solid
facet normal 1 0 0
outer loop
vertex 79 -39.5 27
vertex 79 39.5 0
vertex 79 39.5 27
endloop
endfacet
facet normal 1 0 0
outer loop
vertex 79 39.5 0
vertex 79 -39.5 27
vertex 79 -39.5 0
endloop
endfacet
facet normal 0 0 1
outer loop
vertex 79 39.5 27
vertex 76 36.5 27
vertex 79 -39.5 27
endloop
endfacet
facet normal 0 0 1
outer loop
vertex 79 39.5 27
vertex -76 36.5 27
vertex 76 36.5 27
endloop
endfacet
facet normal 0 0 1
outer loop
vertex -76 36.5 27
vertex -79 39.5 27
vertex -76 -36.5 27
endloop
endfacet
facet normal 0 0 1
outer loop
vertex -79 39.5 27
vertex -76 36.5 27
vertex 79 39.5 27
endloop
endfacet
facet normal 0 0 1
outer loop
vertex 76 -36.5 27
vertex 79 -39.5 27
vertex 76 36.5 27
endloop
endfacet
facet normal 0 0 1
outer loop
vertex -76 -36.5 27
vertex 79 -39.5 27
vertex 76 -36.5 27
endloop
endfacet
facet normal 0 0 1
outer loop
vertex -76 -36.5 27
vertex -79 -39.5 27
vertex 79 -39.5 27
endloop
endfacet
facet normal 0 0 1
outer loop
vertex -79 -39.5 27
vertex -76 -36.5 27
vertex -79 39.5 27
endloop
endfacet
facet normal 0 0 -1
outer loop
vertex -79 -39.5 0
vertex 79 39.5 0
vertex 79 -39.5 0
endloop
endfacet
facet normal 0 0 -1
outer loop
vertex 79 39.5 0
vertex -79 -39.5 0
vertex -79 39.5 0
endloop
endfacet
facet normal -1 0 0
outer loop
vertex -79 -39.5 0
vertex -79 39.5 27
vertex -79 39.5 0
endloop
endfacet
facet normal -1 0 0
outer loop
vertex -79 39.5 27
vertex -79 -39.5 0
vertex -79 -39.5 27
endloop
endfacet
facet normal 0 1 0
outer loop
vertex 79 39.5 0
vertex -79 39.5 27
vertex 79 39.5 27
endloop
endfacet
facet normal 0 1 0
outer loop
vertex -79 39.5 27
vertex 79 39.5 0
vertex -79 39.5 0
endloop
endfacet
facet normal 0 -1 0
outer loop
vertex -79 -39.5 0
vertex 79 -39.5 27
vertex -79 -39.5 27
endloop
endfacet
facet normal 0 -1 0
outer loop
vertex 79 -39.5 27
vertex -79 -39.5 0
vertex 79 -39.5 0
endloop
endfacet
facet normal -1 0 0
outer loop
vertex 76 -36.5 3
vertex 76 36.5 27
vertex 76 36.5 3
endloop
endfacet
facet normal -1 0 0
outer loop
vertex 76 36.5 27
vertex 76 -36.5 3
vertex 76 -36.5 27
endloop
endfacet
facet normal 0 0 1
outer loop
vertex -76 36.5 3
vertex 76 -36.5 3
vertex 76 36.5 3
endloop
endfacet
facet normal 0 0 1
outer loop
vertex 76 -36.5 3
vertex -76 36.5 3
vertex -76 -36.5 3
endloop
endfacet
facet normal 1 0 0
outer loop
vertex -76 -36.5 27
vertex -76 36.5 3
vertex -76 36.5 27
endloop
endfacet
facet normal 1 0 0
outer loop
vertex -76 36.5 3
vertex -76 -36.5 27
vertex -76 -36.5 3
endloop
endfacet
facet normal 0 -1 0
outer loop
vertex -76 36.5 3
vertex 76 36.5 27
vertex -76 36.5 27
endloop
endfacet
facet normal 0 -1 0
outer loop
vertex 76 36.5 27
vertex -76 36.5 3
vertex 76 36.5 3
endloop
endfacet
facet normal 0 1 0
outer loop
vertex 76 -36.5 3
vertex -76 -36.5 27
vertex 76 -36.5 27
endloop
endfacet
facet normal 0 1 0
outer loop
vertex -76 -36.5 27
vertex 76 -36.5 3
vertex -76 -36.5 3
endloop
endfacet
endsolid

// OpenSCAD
/*
 Creates a simple box that can be hung from a wire fence.  The
 default dimensions match a standard "chicken tractor" and can
 hold either food or water for about 4 chickens.

 If you want to hang on chicken wire, measure the distance between
 two horizontal twists and use that as the HangerPitch.
*/

BoxHeight = 27; // Height of box
BoxWidth = 158;  // Width
BoxDepth = 79;  // Depth
WallThickness = 3;  // Wall thickness
HangerWidth = 6; // Width of hanger
HangerHeight = 8; // Height of hanger
HangerPitch = 13; // Increments for hanger placement
HangerDepth = 3.2; // depth of hanger, also hanger offset

/*
  The rest of these are derived from
  the above.
*/
// Half values for translations
BoxHalfWidth = BoxWidth/2;
BoxHalfDepth = BoxDepth/2;
HangerHalfWidth = HangerWidth/2;
HangerInset = (HangerPitch-HangerWidth) / 2;

// Last possible offset for a hanger is based on the half width
HangerPitchCount = floor(BoxWidth/HangerPitch) -1;
HangerEdgeOffset = HangerPitch * HangerPitchCount / 2;

// Offsets for hanger.  Based on centering the hanger width within a hanger increment
LeftHangerPosition = -1 * (HangerEdgeOffset - HangerInset);
RightHangerPosition = HangerEdgeOffset - HangerWidth - HangerInset;
VerticalHangerOffset = BoxHeight - HangerHeight;
HangerOvershoot = HangerHeight - HangerDepth;
HangerOuterY = -1 * (BoxHalfDepth + (HangerDepth * 2));
HangerInnerY = -1 * (BoxHalfDepth + HangerDepth);

// spacer bar is based on the above
SpacerBarPosition = BoxHalfWidth / 5;
SpacerBarWidth = BoxWidth / 5;

// Create the main box, a simple cube with another smaller cube cut out
module MainBox() {
    translate([BoxHalfWidth*-1,BoxHalfDepth*-1,0]) {
        difference() {
            cube([BoxWidth,BoxDepth,BoxHeight]);
            translate([WallThickness,WallThickness,WallThickness]){
                cube([BoxWidth-(2*WallThickness),BoxDepth-(2*WallThickness),BoxHeight-WallThickness]);
            }
        }
    }
}

// Create a hanger, basically two overlapping cubes that will
// fit within the pitch supplied.
module Hanger(pos) {
    translate([pos,HangerOuterY,VerticalHangerOffset]) {
        cube([HangerWidth,HangerDepth,HangerHeight]);
        translate([0,HangerDepth,HangerOvershoot]) {
            cube([HangerWidth,HangerDepth,HangerDepth]);
        }
    }
}

// Spacer is placed on the bottom, to ensure the box stays upright when hung
module SpaceBar() {
    translate([-1 * SpacerBarPosition,HangerInnerY,0]) {
        cube([SpacerBarWidth,HangerDepth,HangerDepth]);
    }
}

MainBox();
// Hanger(LeftHangerPosition);
// Hanger(RightHangerPosition);
// SpaceBar();
